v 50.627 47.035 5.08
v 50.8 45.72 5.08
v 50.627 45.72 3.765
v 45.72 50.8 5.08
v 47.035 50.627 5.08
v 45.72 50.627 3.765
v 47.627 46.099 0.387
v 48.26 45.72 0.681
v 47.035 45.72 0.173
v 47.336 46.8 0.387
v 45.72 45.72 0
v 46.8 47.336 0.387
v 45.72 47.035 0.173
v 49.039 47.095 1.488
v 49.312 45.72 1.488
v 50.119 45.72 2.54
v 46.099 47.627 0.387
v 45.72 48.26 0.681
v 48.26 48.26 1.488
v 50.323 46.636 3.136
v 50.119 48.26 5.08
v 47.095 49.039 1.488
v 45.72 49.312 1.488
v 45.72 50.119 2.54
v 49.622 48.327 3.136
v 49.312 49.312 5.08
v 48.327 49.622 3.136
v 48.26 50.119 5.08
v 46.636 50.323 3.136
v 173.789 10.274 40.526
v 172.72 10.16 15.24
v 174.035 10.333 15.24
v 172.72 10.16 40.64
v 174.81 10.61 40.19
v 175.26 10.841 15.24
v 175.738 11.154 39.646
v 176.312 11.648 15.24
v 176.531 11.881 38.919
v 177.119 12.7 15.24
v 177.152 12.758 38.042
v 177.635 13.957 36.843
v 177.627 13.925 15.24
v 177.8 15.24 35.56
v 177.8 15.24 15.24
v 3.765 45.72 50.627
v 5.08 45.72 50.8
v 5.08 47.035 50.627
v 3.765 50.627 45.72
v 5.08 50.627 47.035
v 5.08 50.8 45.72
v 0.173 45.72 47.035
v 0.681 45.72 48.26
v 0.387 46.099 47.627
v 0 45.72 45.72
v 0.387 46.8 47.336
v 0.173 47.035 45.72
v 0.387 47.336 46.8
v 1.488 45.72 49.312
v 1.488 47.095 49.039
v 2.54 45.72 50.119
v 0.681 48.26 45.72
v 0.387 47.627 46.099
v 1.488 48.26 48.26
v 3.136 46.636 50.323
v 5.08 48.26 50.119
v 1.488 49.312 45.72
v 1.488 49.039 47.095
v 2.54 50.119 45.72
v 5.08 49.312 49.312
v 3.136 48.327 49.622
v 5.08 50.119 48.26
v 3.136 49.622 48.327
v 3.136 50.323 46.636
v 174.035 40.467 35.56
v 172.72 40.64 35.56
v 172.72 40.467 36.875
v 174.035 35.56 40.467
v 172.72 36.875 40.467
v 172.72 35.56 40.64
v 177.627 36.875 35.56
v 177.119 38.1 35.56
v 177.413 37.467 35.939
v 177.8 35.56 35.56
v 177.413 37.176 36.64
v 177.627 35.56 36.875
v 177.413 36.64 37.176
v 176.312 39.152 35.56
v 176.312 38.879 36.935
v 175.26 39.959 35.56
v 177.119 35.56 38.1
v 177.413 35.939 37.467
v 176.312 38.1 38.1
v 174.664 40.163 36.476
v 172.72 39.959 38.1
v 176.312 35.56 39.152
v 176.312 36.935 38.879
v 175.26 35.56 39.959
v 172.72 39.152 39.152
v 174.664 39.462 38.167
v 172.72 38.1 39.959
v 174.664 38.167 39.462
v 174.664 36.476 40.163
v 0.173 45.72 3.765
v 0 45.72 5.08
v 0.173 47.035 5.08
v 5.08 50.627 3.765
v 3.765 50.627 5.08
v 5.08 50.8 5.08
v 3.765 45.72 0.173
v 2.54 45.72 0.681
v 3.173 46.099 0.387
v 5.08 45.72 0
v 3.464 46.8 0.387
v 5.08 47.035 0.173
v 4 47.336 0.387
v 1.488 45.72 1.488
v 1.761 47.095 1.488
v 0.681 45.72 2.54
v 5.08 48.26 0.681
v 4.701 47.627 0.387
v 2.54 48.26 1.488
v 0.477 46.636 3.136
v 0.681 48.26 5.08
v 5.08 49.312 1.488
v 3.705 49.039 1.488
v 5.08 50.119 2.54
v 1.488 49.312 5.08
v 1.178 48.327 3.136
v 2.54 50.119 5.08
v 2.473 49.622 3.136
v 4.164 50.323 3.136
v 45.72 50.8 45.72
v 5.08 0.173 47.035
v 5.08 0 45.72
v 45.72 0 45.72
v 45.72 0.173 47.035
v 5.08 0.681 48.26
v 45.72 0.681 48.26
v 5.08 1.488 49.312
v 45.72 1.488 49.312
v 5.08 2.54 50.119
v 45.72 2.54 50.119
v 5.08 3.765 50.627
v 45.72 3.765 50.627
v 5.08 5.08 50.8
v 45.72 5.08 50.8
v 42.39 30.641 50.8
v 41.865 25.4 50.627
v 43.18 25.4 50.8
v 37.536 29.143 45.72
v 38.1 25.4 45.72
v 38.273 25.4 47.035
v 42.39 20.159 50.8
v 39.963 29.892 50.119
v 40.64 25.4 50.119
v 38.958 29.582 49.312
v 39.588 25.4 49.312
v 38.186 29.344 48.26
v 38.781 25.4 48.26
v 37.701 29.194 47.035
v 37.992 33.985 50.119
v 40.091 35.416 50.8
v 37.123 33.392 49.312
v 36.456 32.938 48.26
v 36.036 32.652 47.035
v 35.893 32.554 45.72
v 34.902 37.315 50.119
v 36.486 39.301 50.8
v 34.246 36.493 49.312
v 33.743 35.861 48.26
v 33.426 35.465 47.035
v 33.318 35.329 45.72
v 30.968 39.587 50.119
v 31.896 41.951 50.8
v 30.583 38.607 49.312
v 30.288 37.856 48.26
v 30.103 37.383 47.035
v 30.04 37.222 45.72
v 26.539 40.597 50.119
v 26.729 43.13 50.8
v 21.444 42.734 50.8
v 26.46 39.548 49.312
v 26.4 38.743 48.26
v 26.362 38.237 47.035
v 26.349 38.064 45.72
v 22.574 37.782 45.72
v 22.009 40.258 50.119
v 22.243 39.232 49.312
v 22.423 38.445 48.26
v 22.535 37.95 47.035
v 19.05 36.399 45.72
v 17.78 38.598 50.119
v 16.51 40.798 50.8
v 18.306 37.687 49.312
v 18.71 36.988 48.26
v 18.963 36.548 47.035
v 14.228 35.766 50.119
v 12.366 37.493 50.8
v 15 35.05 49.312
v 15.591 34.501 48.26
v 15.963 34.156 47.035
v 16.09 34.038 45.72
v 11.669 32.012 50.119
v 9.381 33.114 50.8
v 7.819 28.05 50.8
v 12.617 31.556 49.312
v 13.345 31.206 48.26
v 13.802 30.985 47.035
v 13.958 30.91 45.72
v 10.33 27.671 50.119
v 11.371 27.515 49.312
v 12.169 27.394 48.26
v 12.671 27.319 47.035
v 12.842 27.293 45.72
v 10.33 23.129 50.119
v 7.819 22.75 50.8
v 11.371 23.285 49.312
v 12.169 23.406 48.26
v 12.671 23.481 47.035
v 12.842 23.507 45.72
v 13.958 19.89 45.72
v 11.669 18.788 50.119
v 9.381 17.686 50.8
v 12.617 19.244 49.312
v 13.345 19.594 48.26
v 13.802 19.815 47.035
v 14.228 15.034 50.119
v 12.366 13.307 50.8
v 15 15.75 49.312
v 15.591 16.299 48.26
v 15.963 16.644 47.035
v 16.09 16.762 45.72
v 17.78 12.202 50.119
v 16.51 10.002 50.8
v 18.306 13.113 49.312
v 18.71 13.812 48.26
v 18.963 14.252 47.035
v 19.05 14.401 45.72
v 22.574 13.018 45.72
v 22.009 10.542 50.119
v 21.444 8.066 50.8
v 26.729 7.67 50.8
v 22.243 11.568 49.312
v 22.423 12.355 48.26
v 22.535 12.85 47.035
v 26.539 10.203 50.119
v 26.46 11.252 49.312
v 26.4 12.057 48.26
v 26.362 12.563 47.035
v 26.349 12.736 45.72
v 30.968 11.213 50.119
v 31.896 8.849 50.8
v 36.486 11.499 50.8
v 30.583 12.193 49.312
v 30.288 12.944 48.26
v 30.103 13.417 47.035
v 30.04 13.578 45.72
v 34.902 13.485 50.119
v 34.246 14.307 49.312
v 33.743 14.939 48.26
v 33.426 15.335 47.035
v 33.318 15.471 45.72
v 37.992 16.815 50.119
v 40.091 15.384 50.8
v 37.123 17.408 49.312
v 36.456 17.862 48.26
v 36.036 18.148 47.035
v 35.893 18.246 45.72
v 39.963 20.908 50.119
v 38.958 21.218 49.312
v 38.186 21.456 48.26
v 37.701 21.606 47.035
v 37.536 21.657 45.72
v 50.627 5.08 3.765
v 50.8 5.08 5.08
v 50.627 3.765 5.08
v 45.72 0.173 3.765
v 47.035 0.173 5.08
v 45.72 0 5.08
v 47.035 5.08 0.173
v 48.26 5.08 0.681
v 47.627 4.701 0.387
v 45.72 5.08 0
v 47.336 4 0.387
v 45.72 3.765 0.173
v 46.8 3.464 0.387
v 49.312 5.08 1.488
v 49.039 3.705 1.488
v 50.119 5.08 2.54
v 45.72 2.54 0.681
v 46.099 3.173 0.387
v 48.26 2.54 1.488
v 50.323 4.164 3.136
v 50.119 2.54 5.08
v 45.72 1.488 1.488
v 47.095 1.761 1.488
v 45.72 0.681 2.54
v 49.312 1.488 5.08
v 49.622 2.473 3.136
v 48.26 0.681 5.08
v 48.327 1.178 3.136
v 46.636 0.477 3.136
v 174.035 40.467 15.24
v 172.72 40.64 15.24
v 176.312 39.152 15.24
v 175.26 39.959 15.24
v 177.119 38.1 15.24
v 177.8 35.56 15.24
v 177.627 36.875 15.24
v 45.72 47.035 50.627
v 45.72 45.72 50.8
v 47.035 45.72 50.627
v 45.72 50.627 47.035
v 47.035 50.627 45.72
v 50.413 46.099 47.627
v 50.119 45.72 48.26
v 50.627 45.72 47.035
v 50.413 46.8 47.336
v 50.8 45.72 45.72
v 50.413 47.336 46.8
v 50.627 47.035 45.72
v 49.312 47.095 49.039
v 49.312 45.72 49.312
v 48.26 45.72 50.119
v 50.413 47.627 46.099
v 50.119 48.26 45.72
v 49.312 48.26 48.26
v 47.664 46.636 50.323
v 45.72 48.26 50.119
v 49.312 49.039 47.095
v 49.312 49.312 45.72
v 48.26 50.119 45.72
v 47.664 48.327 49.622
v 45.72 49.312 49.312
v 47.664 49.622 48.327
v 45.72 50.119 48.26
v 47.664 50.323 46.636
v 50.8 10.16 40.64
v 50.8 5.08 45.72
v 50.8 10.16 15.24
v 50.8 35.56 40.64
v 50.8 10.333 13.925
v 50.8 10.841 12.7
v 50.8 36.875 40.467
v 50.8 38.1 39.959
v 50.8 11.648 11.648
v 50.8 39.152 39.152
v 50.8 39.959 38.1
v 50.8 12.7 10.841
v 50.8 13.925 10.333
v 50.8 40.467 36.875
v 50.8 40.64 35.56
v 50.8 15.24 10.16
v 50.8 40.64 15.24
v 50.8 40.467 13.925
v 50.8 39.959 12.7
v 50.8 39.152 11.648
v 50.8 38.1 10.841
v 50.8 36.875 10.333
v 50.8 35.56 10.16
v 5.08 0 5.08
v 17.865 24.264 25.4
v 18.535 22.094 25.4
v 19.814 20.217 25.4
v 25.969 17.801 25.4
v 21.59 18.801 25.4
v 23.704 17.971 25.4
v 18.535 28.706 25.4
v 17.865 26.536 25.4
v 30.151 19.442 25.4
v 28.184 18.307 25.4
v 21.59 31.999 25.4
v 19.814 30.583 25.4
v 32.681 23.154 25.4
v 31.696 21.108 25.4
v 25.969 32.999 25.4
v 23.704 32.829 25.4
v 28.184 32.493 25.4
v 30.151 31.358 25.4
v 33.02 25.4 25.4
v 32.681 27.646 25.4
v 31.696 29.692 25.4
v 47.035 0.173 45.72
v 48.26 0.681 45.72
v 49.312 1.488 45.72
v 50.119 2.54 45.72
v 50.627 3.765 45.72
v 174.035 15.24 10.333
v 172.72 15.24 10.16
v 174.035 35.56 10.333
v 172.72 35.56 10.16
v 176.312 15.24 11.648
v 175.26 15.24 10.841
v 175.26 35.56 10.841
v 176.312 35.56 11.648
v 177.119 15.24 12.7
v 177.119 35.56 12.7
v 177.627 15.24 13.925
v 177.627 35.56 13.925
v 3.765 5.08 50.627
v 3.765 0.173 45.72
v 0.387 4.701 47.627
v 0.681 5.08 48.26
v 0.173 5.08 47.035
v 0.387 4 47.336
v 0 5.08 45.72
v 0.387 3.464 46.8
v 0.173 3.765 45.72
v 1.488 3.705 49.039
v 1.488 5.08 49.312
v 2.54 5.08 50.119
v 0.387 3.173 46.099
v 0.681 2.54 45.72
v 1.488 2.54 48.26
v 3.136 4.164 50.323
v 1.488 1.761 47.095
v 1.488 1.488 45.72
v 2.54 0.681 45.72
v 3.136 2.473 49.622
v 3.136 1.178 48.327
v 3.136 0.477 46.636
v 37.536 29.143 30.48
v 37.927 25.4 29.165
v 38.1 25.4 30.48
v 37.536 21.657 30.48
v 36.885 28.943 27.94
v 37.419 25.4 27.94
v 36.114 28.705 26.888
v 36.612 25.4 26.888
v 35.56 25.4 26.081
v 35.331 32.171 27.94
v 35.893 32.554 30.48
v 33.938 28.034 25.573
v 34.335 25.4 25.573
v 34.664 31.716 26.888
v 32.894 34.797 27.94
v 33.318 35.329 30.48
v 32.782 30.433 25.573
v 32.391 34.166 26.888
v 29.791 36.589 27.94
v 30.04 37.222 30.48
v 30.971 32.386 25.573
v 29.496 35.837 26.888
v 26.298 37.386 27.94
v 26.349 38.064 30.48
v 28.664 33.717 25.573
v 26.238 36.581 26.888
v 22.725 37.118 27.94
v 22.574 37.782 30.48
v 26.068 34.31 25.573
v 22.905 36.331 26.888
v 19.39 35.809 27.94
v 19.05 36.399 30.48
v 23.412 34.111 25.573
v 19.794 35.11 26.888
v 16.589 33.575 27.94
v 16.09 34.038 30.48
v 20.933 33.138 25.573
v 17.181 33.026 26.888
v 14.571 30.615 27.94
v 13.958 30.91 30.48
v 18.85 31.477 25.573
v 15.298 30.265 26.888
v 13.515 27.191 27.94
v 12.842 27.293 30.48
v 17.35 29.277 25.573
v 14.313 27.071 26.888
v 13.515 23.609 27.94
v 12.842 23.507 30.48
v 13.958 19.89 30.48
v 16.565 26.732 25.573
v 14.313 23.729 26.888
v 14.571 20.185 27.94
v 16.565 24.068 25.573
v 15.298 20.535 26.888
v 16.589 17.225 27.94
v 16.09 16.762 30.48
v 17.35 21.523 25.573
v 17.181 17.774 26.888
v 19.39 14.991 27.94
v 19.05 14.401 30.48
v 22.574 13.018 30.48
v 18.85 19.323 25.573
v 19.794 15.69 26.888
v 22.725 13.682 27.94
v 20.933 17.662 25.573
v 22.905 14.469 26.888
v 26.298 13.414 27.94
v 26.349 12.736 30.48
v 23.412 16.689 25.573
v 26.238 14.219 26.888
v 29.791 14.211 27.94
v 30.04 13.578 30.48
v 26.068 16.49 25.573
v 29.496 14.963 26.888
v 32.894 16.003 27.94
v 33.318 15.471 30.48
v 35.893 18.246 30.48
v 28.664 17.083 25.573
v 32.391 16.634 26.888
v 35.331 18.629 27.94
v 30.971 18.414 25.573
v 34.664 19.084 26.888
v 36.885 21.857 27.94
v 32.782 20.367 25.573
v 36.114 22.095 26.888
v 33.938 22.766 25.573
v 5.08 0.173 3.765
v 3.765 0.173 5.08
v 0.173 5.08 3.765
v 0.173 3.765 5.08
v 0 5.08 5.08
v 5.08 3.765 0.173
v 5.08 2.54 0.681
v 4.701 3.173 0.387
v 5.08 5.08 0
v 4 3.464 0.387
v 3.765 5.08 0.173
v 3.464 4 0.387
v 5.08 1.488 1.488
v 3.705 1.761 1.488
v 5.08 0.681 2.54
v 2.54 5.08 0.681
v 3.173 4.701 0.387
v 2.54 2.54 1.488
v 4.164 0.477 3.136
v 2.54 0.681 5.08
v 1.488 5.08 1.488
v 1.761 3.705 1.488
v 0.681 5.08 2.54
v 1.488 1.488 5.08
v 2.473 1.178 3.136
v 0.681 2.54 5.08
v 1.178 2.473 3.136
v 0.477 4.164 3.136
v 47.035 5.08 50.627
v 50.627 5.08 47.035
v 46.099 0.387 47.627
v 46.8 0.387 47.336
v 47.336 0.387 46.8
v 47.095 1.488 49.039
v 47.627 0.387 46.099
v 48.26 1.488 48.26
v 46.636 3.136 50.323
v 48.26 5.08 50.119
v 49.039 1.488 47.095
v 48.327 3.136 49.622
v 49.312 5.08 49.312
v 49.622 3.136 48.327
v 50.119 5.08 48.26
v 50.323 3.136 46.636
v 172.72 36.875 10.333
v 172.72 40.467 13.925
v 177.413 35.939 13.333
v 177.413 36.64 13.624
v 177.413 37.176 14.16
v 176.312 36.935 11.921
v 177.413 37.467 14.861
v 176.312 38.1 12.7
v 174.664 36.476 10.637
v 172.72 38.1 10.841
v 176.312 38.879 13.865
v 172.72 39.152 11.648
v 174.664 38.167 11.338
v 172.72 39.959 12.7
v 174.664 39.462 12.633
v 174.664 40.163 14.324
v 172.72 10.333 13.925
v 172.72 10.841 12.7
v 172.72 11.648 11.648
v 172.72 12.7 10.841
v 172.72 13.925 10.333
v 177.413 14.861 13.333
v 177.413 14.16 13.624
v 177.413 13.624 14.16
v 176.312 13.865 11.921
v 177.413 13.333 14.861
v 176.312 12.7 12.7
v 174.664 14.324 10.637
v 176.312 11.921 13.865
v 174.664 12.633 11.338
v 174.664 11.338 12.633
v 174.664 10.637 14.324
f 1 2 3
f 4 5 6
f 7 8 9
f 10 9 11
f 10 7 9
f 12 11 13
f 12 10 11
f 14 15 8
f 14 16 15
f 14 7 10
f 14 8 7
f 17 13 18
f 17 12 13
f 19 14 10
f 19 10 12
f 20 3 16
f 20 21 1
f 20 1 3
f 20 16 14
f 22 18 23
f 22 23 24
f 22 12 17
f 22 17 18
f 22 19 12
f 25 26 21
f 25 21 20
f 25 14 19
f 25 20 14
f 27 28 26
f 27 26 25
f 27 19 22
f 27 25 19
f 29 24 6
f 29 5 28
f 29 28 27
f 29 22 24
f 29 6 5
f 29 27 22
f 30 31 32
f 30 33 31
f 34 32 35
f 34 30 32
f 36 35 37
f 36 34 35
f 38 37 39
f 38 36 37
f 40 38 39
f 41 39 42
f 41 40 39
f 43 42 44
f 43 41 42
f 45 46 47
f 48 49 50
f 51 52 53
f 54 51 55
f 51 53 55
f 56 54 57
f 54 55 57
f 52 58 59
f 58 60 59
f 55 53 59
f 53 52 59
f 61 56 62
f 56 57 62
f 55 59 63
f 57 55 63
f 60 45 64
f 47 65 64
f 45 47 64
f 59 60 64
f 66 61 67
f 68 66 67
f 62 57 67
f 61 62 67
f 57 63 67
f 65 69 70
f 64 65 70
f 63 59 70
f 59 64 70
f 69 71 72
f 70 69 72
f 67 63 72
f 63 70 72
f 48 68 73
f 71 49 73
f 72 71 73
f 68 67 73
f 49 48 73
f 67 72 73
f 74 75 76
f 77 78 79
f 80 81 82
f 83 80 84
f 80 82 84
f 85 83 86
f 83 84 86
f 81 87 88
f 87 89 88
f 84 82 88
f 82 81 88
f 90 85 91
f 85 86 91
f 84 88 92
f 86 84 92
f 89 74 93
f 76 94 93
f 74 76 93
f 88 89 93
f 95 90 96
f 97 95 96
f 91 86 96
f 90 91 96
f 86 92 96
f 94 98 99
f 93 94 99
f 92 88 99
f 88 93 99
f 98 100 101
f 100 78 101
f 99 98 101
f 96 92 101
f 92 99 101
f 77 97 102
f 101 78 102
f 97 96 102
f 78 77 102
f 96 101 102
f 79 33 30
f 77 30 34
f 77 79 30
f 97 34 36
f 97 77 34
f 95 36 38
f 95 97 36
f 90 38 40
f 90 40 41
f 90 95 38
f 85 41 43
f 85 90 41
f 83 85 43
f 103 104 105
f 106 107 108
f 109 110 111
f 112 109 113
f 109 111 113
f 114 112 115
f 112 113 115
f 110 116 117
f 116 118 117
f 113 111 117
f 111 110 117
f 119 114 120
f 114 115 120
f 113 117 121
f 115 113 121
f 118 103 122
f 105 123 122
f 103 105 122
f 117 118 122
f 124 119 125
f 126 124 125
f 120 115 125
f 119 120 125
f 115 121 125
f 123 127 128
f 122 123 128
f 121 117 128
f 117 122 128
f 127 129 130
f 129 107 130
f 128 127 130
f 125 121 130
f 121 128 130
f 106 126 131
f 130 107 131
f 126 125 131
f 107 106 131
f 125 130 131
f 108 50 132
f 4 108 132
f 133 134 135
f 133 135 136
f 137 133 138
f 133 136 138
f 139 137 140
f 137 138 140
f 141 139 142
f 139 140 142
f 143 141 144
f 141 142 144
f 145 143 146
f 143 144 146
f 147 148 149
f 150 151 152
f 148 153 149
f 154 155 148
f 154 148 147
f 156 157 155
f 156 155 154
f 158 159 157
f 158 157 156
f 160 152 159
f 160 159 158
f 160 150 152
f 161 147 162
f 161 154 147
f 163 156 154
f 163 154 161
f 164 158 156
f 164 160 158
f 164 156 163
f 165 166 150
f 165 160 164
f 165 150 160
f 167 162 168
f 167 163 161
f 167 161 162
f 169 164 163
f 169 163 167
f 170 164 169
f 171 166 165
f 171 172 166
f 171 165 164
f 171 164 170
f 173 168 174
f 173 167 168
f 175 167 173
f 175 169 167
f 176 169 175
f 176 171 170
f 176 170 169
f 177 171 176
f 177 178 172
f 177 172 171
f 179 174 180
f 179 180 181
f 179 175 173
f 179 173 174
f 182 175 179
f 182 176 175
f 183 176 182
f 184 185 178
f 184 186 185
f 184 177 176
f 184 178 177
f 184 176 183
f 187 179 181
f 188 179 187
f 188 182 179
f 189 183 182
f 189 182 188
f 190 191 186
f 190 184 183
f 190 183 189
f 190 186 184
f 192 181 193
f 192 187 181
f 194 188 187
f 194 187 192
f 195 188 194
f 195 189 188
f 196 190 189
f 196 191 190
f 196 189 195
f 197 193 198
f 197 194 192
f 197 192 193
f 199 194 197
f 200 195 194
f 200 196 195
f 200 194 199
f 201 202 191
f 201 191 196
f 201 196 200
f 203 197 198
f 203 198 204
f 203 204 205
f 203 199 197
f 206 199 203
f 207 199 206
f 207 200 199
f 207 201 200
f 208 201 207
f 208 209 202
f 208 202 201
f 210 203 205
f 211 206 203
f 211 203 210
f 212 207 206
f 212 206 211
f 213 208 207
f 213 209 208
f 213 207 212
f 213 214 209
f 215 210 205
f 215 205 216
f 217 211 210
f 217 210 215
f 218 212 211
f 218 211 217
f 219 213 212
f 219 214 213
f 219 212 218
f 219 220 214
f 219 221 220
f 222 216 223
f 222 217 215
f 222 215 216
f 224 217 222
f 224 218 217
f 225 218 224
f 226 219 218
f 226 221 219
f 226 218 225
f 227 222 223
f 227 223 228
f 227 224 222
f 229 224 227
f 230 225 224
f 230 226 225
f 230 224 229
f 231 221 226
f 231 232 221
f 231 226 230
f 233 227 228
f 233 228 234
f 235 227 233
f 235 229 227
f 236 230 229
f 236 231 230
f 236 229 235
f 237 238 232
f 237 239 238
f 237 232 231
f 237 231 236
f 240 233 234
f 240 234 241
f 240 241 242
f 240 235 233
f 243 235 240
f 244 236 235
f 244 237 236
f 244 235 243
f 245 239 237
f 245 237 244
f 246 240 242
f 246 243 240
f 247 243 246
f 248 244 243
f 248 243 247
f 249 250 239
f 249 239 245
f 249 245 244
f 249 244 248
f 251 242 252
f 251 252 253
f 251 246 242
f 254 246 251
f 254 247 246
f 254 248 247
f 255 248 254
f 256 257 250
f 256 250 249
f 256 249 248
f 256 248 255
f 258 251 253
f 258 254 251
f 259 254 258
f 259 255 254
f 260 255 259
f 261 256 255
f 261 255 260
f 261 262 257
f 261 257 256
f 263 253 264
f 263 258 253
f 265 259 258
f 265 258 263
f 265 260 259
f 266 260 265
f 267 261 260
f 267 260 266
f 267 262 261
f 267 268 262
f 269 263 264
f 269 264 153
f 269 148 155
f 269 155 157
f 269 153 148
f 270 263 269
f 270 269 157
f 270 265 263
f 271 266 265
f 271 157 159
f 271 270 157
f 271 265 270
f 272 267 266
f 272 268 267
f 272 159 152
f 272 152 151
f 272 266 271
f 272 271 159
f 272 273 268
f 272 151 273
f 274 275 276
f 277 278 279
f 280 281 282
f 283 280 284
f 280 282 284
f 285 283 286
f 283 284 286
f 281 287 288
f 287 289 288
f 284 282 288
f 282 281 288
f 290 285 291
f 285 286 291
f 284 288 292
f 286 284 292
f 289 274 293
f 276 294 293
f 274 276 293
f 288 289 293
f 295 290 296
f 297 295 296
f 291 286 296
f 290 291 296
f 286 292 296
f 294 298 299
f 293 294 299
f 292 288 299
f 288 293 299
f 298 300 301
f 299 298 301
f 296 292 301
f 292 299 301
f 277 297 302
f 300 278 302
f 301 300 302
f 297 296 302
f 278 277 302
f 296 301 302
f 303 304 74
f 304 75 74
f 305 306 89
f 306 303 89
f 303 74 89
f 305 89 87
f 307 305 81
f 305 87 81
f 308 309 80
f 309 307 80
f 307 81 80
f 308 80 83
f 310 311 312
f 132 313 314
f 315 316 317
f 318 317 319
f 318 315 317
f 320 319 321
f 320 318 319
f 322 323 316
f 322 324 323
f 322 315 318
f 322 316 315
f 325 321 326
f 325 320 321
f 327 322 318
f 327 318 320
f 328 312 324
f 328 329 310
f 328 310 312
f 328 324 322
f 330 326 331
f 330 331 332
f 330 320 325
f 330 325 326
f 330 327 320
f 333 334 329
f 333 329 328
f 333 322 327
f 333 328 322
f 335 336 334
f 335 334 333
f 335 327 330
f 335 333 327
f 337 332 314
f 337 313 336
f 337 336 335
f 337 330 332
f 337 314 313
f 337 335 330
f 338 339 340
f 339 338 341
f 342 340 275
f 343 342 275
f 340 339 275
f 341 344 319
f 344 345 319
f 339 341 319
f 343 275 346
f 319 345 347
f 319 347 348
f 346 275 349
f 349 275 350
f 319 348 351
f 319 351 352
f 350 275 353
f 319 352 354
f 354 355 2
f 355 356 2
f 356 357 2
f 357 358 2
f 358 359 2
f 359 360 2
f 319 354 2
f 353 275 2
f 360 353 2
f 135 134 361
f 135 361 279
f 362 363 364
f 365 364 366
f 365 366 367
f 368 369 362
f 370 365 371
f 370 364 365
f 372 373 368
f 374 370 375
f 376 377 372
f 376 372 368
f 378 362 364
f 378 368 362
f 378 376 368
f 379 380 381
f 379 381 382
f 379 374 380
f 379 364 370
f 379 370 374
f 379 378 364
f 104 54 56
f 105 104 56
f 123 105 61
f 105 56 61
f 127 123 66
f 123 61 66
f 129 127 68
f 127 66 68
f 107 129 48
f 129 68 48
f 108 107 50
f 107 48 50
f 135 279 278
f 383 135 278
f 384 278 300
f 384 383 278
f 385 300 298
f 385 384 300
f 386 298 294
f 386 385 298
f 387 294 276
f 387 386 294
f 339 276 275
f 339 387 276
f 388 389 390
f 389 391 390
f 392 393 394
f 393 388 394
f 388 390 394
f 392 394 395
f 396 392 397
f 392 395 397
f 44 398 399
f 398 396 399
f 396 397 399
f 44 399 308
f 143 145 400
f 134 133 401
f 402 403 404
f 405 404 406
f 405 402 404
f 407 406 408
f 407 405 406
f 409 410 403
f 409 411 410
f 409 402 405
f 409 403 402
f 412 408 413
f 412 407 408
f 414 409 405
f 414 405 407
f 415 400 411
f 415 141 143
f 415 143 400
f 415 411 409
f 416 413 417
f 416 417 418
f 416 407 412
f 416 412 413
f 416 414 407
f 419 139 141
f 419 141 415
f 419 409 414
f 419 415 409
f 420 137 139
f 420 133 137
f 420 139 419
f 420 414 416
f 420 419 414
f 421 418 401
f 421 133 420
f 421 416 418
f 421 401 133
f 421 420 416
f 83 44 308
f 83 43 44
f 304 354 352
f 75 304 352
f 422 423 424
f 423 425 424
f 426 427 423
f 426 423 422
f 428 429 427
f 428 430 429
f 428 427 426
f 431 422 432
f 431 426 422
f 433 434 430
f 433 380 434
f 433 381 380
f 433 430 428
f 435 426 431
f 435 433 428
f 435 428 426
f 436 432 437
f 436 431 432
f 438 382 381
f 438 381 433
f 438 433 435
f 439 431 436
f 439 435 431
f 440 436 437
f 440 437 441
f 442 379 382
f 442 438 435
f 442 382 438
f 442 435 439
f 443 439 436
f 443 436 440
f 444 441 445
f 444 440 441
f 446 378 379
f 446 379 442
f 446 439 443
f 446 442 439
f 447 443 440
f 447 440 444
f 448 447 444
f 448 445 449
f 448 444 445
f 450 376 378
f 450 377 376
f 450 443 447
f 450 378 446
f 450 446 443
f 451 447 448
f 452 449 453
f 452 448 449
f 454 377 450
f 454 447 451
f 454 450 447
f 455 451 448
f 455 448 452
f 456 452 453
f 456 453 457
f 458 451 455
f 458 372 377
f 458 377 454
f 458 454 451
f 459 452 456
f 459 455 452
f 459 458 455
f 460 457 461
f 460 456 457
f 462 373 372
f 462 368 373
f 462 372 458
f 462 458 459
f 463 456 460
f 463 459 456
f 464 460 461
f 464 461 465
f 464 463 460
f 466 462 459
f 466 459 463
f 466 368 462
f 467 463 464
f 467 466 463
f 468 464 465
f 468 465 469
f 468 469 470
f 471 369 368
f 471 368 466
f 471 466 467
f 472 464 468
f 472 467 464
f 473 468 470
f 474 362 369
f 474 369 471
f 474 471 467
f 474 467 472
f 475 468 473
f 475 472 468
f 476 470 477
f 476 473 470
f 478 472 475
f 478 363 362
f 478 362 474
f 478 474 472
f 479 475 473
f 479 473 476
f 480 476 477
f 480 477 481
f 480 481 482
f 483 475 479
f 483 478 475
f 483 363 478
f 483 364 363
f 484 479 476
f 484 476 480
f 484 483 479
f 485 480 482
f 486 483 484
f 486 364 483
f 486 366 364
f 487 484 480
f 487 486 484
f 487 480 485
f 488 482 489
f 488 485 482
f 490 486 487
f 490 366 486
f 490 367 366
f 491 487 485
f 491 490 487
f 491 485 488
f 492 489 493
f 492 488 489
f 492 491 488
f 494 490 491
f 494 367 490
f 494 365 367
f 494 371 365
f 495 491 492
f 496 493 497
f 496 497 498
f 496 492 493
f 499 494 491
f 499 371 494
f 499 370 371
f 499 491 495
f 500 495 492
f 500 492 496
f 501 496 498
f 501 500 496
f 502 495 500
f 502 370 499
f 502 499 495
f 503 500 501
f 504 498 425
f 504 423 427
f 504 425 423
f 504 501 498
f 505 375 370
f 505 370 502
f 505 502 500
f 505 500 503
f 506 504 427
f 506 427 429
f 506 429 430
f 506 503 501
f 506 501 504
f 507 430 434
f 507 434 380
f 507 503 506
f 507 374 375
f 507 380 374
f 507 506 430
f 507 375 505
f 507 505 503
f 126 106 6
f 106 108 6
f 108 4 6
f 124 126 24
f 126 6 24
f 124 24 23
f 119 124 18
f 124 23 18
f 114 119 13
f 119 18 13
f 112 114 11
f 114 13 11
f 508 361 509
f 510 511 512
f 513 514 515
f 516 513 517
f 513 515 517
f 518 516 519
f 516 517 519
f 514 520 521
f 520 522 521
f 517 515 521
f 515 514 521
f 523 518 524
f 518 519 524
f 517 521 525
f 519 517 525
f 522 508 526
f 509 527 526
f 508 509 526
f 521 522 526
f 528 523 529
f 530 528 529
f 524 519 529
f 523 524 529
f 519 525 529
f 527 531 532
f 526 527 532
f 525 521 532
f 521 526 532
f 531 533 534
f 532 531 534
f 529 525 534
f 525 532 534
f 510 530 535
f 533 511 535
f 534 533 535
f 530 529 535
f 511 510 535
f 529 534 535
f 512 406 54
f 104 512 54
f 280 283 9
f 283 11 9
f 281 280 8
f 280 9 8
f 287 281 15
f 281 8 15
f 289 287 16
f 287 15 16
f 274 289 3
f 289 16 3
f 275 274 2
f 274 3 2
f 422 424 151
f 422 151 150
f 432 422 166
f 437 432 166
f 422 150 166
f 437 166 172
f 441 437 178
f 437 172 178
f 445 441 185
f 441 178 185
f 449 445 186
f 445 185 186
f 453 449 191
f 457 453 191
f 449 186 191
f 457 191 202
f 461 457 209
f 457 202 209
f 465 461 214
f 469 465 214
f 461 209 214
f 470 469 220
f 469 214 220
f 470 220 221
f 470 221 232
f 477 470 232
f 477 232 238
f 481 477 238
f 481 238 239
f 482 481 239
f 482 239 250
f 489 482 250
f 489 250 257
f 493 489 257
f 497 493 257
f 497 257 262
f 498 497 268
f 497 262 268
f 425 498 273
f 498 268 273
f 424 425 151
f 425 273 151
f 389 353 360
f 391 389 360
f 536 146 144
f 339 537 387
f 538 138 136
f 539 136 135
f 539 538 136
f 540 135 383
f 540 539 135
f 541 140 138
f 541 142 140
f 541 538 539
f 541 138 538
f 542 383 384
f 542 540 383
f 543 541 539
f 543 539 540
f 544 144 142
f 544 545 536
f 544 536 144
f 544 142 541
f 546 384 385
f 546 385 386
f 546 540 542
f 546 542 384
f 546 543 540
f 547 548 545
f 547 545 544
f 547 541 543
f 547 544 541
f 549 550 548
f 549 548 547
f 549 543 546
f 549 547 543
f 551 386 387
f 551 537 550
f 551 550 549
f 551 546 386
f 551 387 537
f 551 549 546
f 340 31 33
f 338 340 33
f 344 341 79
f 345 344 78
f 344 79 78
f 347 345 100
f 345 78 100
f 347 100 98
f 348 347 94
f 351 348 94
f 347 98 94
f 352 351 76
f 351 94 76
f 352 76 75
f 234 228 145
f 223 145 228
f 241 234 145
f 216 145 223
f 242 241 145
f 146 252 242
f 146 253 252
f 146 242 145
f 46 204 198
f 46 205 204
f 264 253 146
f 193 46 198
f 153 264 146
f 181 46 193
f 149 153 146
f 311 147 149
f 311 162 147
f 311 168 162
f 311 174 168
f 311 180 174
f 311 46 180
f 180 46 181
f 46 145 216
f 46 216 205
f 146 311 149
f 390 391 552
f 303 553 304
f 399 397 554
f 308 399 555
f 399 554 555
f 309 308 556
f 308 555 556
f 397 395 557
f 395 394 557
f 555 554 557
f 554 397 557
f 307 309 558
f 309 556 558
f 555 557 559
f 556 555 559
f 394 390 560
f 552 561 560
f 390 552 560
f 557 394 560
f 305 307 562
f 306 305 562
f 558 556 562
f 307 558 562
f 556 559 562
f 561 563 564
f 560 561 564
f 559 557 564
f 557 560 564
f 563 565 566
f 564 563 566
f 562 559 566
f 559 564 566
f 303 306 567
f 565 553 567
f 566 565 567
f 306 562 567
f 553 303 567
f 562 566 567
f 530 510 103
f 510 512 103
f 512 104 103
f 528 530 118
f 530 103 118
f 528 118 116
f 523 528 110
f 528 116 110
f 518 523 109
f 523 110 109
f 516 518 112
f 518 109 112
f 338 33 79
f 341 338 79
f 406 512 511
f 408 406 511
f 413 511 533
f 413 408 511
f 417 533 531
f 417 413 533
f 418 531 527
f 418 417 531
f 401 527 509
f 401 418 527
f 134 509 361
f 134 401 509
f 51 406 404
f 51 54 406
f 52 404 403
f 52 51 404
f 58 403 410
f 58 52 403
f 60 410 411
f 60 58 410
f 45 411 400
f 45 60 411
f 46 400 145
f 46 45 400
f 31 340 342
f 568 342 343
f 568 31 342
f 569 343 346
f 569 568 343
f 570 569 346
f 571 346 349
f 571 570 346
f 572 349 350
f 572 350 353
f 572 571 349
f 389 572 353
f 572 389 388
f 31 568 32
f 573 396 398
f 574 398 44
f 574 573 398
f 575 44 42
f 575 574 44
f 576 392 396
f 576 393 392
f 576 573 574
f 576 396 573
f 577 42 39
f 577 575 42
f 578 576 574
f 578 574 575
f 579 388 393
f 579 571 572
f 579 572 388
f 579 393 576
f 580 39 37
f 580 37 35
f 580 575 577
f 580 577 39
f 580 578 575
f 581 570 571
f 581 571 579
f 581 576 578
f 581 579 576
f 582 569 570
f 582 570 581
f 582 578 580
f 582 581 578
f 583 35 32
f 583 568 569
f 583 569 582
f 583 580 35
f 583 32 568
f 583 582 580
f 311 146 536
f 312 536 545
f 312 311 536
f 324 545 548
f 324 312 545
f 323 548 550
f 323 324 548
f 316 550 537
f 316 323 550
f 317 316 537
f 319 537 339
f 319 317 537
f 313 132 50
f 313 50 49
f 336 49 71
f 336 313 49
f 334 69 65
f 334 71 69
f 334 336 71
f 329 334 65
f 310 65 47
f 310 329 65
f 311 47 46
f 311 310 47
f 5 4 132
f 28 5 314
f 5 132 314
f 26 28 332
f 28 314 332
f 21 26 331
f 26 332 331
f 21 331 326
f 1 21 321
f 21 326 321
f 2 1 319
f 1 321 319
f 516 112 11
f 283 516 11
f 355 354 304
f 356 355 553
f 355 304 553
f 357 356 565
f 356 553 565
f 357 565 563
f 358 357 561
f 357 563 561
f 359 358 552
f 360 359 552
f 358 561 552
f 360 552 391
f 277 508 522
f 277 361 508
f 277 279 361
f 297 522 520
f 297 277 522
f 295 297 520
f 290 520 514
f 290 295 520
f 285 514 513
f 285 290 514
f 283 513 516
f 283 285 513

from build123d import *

# Parameters (mm, degrees)
F0_W     = 50.8
F0_H     = 50.8
F1_DEPTH = 50.8
F2_R     = 12.7
F3_DEPTH = 25.4
F4_R     = 5.08
F5_R     = 5.08
F6_W     = 30.48
F6_H     = 30.48
F7_DEPTH = 127
F8_R     = 5.08


with BuildPart() as f1:
    # F0 (on Top) → F1 (new body)
    with BuildSketch(Plane.XY):
        with Locations((25.4, 25.4)):
            Rectangle(F0_W, F0_H)
    extrude(amount=F1_DEPTH)

    # F2 (on face) → F3 (cut)
    with BuildSketch(Plane.XY.offset(50.8)):
        with Locations((25.4, 25.4)):
            Circle(F2_R)
    extrude(amount=-F3_DEPTH, mode=Mode.SUBTRACT)

    # F4
    f4_edges = [f1.edges().sort_by_distance(p)[0] for p in [
        (25.4, 50.8, 50.8),
        (50.8, 25.4, 50.8),
        (25.4, 0, 50.8),
        (0, 25.4, 50.8),
        (50.8, 0, 25.4),
        (50.8, 50.8, 25.4),
        (50.8, 25.4, 0),
        (0, 0, 25.4),
        (25.4, 0, 0),
        (0, 50.8, 25.4),
        (0, 25.4, 0),
        (25.4, 50.8, 0),
    ]]
    fillet(f4_edges, radius=F4_R)

    # F5
    f5_edges = [f1.edges().sort_by_distance(p)[0] for p in [
        (12.7, 25.4, 25.4),
        (12.7, 25.4, 50.8),
    ]]
    fillet(f5_edges, radius=F5_R)

    # F6 (on face) → F7 (join)
    with BuildSketch(Plane.YZ.offset(50.8)):
        with Locations((25.4, 25.4)):
            Rectangle(F6_W, F6_H)
    extrude(amount=F7_DEPTH)

    # F8
    f8_edges = [f1.edges().sort_by_distance(p)[0] for p in [
        (114.3, 10.16, 10.16),
        (114.3, 40.64, 40.64),
        (114.3, 40.64, 10.16),
        (177.8, 25.4, 10.16),
        (177.8, 40.64, 25.4),
        (177.8, 25.4, 40.64),
        (177.8, 10.16, 25.4),
    ]]
    fillet(f8_edges, radius=F8_R)


solid = f1.part
